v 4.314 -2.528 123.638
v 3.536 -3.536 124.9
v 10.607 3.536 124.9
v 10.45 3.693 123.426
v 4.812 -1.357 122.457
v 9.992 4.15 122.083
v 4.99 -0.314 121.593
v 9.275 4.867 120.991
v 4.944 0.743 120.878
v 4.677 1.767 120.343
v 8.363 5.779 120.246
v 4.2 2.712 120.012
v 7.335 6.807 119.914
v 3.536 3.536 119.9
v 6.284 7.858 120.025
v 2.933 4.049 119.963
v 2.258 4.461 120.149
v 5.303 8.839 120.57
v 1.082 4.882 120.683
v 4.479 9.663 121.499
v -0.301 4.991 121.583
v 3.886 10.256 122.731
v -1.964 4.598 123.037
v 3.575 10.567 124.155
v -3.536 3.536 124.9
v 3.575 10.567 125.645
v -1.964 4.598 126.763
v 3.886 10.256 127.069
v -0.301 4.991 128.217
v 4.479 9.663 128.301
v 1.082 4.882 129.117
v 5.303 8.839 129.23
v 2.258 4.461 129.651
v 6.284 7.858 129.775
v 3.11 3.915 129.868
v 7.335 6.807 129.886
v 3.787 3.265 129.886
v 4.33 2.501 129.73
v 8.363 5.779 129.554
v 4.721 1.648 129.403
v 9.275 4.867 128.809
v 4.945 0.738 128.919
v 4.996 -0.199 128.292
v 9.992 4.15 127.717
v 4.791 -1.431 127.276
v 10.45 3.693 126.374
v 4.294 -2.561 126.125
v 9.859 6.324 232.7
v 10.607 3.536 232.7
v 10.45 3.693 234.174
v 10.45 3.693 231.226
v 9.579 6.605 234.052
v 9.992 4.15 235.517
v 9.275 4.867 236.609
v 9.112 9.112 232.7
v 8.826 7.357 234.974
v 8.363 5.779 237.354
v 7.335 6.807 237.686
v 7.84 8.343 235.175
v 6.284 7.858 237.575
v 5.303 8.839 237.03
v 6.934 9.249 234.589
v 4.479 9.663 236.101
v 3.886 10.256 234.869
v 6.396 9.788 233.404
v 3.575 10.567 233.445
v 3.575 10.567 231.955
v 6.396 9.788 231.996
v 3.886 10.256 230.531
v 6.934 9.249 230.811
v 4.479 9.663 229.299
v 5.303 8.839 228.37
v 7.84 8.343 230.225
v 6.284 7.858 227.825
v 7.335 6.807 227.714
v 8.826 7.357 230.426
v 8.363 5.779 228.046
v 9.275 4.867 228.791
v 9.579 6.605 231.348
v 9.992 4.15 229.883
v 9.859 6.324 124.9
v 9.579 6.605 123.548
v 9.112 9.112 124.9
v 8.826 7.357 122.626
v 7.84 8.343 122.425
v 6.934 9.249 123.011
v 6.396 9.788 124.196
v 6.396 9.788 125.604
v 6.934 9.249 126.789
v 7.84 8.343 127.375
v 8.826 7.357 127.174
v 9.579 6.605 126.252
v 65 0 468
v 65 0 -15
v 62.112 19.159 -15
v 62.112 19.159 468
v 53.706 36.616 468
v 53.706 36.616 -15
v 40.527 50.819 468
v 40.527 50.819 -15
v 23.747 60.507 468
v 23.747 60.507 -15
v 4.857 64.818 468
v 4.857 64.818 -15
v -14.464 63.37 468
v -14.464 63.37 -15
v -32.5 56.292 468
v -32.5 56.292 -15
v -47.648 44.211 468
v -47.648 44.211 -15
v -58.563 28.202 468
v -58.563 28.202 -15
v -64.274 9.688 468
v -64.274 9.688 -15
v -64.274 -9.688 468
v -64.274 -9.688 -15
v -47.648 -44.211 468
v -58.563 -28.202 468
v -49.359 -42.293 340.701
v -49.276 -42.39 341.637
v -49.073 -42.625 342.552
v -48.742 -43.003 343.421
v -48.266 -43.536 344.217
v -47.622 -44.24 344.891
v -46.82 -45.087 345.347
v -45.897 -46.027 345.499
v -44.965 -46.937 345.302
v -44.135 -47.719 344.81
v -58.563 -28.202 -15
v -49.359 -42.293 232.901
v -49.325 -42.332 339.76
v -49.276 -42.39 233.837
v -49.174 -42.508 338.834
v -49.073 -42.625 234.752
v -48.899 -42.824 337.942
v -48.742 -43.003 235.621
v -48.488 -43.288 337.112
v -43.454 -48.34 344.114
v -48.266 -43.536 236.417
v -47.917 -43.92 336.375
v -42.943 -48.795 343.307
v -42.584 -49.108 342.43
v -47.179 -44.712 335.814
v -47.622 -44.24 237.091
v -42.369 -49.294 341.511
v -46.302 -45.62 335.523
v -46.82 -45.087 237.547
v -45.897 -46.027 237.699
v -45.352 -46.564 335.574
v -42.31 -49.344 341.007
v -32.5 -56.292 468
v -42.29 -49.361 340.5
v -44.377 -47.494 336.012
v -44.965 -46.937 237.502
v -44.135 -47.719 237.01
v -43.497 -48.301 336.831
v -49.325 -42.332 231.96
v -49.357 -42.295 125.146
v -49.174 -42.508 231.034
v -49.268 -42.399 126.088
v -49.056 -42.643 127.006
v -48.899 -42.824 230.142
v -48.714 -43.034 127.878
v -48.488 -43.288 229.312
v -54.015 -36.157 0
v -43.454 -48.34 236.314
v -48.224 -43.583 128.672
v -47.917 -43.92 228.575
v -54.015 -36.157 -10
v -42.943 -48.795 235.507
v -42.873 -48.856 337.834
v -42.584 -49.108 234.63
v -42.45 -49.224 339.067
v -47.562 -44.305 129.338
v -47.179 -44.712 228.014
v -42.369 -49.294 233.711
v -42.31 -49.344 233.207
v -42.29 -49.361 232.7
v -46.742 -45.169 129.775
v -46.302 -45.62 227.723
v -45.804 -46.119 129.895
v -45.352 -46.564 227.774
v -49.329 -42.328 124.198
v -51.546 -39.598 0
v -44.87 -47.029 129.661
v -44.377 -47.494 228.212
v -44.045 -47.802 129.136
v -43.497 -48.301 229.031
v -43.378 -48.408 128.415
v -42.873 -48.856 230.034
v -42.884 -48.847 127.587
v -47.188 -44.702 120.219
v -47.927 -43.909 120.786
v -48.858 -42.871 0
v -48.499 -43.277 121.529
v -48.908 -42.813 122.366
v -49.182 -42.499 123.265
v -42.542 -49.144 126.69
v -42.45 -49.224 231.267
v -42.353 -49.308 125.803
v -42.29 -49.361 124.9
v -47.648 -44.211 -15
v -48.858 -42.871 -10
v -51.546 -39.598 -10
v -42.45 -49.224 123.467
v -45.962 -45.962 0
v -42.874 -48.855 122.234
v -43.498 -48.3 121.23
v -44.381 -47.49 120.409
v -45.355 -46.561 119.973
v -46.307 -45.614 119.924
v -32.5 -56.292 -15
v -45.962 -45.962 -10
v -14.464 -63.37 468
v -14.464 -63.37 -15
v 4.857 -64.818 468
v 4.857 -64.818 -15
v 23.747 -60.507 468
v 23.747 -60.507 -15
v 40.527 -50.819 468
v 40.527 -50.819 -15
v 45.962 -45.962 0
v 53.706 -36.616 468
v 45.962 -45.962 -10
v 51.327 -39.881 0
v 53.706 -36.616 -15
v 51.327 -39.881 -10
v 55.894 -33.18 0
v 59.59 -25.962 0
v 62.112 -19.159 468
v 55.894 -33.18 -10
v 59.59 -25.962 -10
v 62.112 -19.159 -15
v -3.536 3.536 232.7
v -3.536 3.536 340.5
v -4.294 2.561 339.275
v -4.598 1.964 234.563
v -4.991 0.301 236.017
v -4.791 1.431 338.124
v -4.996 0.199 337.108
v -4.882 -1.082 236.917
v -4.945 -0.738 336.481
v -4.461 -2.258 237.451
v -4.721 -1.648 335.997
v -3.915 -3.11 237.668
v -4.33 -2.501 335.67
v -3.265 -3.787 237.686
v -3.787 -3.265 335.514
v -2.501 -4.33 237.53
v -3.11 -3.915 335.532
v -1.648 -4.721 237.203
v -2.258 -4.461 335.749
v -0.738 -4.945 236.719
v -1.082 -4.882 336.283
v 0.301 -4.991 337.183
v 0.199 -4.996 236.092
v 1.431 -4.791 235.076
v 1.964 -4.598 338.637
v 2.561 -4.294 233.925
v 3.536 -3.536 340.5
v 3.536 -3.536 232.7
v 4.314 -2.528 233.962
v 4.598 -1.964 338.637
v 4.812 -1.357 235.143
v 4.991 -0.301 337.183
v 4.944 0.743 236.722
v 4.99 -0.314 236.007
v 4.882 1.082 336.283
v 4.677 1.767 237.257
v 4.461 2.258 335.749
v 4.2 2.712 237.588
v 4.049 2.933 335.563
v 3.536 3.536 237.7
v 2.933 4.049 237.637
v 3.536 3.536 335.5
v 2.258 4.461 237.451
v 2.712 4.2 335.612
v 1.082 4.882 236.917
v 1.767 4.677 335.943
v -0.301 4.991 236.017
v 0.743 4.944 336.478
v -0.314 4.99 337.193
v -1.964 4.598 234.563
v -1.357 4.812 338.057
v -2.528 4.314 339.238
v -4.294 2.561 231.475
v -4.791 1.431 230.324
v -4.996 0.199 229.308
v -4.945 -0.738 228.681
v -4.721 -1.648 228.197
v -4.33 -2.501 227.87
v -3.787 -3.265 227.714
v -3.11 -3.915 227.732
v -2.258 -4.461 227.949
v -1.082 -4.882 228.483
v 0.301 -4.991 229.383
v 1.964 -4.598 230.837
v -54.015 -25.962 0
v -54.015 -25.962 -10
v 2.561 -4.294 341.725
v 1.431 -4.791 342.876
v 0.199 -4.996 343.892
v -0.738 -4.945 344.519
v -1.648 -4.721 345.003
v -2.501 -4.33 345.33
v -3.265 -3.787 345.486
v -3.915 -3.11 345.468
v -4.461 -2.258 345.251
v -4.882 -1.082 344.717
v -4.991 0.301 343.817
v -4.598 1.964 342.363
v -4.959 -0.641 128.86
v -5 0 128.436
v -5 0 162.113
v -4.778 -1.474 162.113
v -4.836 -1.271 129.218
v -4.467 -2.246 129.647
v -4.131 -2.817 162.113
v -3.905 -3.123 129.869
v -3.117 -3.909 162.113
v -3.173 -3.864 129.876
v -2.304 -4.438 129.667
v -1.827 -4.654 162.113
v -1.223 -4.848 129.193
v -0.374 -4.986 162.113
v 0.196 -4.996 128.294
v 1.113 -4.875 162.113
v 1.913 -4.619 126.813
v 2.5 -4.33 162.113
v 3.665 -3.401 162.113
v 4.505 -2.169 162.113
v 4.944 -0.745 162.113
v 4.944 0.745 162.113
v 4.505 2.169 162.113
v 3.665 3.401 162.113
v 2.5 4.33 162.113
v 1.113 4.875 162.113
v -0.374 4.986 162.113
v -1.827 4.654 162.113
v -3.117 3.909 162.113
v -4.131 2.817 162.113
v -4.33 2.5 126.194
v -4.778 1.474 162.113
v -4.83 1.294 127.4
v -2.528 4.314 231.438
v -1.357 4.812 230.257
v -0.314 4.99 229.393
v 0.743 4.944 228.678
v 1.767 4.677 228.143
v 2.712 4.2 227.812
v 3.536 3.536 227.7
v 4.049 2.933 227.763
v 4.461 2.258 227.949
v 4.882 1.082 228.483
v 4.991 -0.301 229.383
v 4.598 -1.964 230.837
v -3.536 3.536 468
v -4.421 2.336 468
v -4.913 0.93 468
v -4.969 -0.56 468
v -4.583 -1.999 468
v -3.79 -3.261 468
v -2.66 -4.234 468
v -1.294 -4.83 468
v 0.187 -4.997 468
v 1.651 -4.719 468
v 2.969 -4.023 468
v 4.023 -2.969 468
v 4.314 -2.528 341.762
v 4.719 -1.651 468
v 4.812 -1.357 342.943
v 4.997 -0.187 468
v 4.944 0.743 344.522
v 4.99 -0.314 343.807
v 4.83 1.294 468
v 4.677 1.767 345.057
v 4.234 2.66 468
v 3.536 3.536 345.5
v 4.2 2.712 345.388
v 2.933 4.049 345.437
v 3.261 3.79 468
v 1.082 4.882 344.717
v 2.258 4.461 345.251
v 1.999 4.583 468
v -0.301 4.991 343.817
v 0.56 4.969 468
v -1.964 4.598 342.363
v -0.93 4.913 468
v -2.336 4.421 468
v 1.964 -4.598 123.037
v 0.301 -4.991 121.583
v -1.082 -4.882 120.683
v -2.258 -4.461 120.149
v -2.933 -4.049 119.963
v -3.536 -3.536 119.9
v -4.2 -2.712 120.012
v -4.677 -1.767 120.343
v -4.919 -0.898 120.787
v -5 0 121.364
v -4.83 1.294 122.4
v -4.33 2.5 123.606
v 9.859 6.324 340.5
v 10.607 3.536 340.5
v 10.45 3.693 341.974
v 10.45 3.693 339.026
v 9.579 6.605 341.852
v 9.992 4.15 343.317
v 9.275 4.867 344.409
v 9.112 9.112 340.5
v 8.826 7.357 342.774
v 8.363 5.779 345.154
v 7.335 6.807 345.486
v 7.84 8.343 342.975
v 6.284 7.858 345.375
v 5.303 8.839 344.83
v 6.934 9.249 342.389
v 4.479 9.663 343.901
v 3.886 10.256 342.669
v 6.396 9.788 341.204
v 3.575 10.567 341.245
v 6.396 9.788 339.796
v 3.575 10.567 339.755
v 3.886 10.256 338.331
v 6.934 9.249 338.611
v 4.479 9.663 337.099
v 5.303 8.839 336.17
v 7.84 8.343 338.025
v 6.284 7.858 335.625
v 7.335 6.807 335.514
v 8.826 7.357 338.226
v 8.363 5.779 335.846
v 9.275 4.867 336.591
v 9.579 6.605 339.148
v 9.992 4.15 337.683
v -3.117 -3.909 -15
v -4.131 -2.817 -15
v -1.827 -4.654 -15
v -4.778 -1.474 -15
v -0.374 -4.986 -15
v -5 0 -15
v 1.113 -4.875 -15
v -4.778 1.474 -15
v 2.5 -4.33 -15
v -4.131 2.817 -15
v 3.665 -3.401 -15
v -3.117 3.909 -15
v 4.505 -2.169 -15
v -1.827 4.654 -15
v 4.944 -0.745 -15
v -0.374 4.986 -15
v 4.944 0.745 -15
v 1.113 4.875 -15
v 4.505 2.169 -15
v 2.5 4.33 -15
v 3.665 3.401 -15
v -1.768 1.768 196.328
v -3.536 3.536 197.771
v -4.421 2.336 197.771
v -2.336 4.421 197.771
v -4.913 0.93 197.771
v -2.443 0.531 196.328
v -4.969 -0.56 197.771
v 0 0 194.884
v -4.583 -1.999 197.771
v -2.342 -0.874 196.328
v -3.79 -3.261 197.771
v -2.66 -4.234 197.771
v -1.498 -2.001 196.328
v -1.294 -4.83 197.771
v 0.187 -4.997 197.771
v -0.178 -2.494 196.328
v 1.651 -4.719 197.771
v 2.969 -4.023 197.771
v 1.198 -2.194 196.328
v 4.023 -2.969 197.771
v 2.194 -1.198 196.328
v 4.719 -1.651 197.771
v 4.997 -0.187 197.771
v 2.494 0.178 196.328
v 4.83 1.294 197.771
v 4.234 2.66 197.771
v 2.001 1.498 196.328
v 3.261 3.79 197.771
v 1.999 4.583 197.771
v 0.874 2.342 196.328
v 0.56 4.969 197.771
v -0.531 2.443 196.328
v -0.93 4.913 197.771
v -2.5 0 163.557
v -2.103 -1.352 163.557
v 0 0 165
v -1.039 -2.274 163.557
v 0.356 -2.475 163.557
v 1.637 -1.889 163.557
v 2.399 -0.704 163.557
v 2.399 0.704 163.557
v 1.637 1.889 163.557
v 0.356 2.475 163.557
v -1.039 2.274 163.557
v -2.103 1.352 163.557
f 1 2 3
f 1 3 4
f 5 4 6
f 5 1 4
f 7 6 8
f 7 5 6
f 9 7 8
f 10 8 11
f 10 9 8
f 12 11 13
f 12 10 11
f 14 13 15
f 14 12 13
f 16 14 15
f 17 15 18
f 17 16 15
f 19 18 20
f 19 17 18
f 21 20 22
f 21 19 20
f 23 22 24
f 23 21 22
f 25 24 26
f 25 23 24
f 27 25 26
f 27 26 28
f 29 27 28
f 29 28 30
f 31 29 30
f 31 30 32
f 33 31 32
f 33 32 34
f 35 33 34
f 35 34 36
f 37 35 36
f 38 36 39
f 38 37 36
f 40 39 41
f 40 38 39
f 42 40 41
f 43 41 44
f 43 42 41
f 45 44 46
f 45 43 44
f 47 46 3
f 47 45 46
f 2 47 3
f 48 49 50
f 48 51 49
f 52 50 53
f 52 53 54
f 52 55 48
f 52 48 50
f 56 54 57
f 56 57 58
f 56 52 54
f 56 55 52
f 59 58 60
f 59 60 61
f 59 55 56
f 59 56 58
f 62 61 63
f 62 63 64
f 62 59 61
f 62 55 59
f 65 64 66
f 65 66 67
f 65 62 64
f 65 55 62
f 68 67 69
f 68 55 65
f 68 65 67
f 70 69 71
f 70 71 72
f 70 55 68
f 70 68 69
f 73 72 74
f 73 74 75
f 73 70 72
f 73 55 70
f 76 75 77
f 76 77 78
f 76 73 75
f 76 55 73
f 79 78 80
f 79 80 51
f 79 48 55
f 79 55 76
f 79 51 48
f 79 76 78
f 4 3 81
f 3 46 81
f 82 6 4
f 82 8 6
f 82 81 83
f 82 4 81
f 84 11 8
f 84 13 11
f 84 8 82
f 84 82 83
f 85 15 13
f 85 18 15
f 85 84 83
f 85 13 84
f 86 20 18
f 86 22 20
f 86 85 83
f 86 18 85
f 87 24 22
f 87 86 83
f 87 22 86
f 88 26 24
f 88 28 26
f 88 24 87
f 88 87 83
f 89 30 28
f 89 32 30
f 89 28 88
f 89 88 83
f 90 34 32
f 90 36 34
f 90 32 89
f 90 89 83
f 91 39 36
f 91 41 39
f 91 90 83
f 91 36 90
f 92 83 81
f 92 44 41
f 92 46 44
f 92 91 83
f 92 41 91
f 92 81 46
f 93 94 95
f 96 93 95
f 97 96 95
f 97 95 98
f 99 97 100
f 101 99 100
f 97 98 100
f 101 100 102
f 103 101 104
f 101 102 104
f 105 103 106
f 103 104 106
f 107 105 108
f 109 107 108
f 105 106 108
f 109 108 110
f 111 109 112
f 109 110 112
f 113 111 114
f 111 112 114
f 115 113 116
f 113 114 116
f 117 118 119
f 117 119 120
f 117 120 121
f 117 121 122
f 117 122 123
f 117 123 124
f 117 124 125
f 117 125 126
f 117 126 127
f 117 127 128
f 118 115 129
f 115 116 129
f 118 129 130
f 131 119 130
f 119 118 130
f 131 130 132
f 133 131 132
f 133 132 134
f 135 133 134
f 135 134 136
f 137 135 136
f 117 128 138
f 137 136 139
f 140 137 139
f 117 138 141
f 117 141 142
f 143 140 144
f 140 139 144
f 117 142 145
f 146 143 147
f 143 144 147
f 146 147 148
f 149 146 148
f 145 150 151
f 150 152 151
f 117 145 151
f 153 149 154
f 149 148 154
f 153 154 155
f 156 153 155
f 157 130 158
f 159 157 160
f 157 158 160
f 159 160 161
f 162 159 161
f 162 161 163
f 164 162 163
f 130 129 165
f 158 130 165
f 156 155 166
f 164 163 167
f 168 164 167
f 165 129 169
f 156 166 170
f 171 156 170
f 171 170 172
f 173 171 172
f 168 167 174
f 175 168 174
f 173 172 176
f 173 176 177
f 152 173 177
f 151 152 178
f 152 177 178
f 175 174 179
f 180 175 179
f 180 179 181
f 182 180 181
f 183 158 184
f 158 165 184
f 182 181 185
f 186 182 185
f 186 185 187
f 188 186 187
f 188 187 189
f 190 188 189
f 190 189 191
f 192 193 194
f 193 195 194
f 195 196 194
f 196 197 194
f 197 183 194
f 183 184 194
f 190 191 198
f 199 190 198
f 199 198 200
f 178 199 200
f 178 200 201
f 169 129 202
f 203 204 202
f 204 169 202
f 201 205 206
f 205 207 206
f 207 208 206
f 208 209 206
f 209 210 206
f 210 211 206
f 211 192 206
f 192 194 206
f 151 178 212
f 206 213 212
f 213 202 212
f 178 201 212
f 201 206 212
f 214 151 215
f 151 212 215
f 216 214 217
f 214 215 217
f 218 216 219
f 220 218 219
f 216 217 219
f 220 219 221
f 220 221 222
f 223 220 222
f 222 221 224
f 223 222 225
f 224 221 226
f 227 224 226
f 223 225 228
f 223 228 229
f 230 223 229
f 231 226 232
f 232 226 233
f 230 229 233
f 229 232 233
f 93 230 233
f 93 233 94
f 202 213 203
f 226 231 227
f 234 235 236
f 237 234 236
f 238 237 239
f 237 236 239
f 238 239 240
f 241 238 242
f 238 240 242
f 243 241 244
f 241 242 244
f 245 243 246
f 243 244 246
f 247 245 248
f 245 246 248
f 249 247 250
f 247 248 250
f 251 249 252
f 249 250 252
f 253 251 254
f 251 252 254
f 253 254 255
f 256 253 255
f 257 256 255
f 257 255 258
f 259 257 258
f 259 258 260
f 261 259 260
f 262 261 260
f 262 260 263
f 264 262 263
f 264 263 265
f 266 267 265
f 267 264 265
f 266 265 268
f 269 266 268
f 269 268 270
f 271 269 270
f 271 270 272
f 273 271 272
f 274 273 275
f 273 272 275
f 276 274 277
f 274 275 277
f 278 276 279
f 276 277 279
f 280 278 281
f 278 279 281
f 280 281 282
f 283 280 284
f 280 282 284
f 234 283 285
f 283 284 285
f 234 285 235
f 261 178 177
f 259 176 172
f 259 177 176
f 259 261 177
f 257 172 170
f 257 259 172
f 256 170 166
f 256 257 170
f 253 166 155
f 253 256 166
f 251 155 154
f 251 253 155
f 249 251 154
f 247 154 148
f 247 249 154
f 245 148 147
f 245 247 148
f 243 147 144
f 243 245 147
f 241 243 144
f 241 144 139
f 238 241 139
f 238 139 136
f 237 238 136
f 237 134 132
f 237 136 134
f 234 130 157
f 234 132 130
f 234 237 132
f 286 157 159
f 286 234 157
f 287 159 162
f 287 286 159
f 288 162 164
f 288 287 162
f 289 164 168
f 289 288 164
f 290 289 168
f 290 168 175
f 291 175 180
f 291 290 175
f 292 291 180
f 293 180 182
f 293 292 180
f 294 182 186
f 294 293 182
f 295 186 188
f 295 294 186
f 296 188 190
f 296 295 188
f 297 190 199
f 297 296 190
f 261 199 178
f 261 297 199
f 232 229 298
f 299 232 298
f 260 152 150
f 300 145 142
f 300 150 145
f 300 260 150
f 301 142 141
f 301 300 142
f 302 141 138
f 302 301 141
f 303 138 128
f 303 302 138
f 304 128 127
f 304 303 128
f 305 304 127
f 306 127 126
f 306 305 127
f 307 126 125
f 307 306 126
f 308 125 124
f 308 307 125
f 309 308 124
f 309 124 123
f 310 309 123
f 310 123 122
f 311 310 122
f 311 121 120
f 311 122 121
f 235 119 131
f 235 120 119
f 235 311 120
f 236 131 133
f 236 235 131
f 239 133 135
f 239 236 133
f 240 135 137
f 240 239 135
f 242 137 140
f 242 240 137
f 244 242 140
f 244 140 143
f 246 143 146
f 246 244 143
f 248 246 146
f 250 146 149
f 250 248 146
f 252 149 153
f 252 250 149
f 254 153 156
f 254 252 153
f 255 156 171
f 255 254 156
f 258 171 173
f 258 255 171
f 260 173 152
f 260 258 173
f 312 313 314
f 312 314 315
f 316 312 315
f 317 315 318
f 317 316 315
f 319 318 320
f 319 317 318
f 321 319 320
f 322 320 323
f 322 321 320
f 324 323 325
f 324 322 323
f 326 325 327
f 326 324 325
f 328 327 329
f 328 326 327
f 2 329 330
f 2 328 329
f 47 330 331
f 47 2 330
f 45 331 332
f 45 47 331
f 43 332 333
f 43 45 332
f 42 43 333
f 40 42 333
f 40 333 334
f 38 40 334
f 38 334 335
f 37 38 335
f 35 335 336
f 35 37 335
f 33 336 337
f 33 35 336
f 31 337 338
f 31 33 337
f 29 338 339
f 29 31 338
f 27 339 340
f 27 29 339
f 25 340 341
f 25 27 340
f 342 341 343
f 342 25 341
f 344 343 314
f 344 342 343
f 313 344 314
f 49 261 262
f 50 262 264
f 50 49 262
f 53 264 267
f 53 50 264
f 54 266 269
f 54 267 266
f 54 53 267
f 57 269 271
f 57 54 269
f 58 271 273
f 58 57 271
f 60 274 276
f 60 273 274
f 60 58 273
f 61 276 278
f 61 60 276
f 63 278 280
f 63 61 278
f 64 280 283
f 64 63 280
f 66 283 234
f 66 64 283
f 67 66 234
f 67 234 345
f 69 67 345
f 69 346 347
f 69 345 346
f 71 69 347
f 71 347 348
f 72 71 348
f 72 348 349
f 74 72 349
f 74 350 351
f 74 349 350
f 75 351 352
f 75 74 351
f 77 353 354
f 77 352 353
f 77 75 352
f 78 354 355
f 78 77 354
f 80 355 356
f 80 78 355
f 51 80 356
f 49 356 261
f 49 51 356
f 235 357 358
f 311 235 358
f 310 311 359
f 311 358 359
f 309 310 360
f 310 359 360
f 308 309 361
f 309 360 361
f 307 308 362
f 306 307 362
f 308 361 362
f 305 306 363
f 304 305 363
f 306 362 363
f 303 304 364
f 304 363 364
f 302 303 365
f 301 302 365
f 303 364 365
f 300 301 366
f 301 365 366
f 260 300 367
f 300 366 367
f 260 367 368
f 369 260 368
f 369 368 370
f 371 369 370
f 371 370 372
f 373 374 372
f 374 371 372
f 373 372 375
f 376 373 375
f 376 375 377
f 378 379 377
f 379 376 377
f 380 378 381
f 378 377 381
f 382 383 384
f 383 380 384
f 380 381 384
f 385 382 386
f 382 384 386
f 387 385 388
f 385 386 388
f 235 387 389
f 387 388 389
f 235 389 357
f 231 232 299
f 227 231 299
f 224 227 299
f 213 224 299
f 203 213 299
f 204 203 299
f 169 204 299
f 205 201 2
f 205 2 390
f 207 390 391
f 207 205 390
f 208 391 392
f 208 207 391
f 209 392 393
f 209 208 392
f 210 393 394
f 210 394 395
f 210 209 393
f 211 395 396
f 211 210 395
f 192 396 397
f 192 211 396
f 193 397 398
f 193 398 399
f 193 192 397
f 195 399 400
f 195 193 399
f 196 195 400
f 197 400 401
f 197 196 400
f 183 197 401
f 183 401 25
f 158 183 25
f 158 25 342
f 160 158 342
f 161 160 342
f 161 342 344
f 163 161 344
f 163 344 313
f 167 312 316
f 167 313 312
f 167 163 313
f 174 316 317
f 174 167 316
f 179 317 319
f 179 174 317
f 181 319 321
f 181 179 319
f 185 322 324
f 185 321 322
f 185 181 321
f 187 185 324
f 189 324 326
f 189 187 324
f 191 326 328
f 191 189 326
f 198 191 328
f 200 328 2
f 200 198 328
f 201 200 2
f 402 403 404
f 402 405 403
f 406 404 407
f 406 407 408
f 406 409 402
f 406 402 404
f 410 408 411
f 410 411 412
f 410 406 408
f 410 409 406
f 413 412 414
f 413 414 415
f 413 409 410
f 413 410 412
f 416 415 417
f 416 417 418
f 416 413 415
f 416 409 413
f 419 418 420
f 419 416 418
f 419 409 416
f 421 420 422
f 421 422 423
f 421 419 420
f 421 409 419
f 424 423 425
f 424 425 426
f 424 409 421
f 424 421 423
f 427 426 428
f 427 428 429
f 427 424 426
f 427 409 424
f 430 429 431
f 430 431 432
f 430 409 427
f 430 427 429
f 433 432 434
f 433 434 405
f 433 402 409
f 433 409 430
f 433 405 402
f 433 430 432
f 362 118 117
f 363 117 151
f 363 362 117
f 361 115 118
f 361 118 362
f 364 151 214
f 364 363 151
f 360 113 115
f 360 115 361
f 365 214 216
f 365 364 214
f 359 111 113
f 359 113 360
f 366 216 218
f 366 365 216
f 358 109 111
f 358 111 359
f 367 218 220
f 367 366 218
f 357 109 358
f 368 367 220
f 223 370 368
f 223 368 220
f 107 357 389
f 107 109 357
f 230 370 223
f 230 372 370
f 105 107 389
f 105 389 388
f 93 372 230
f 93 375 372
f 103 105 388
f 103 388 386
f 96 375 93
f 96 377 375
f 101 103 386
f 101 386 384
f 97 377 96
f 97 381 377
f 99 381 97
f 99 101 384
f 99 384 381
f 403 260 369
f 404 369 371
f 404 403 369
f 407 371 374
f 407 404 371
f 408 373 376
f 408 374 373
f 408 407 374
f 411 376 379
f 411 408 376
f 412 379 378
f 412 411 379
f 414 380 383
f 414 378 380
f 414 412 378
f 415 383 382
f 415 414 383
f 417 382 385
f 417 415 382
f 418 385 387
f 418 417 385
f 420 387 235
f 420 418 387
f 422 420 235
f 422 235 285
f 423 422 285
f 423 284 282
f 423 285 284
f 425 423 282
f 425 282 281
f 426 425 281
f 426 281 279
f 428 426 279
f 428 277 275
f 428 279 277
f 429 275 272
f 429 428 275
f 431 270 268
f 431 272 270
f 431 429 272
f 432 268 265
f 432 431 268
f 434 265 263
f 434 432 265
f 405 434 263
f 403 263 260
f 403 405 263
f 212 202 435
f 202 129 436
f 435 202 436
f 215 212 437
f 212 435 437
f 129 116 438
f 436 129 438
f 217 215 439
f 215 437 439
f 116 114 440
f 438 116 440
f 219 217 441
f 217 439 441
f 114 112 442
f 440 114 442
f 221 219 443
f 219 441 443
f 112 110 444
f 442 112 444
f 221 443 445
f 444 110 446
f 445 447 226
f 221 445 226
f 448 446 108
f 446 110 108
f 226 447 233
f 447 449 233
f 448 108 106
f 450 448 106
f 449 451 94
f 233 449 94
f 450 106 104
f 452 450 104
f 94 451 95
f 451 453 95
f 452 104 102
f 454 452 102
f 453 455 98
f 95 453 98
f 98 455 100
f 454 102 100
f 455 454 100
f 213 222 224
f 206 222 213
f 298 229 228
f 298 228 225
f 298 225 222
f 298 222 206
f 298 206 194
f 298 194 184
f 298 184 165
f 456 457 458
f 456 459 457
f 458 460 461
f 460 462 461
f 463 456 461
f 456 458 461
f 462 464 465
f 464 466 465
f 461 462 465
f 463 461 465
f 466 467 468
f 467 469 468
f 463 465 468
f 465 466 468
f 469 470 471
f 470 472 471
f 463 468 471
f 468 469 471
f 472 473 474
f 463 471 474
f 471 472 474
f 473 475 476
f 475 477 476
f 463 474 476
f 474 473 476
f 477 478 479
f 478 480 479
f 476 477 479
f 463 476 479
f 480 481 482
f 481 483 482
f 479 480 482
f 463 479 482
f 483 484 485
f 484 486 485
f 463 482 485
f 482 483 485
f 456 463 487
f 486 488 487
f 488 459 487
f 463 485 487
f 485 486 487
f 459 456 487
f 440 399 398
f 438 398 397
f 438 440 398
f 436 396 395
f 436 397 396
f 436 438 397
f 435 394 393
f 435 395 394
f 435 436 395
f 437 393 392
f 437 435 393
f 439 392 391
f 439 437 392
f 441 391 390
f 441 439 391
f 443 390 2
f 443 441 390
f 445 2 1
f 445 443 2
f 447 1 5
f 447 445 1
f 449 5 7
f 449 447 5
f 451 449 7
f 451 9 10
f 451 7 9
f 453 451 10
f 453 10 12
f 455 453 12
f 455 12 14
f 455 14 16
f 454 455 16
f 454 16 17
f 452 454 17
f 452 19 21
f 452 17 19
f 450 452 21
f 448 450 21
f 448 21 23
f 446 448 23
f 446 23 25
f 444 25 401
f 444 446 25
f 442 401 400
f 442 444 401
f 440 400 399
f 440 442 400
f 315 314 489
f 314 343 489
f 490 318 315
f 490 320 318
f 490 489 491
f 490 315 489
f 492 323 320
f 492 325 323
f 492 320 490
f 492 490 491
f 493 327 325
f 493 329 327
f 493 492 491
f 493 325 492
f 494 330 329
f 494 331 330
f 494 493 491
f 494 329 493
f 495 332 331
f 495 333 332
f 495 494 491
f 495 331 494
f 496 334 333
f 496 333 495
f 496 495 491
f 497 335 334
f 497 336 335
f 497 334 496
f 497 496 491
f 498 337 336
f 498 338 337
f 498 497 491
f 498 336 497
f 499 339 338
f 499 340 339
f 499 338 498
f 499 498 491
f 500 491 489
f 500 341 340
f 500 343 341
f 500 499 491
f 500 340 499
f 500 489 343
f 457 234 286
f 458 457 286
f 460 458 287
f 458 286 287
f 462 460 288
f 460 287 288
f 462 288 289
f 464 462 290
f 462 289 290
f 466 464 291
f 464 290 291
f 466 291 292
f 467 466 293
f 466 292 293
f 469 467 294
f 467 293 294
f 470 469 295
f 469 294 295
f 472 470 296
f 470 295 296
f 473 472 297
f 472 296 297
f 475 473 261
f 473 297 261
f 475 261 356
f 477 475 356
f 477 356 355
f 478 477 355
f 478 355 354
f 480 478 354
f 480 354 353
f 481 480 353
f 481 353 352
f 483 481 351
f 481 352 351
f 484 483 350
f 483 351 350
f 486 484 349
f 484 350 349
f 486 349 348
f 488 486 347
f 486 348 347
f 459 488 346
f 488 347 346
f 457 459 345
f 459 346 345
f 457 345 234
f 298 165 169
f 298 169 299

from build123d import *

# Parameters (mm, degrees)
EXTRUDEASSE_DEPTH      = 468
EXTRUDEASSE_DEPTH_BACK = 15
SKETCH1_R              = 65
SKETCH6_W              = 125.765742684
SKETCH6_H              = 20
CUT_EXTRUDE1_DEPTH     = 10


with BuildPart() as part:
    # Sketch1 → ExtrudeAsse (new, two sides: drawn at the far end of the back side and taken through both)
    with BuildSketch(Plane.XY.offset(-EXTRUDEASSE_DEPTH_BACK)):
        Circle(SKETCH1_R)
    extrude(amount=EXTRUDEASSE_DEPTH + EXTRUDEASSE_DEPTH_BACK)

    # Sketch3 → Cut-Revolve1 (revolve, cut)
    with BuildSketch(Plane(origin=(0, 0, 0), x_dir=(0, 0, -1), z_dir=(0.7071067811865414, -0.7071067811865537, 0)), mode=Mode.PRIVATE) as cut_revolve1_sk:
        Polygon((-227.7, -65), (-227.7, 10), (-232.7, 12.886751346), (-232.7, 0), (-232.7, -65), align=None)
    revolve(cut_revolve1_sk.sketch.rotate(Axis((0, 0, 232.7), (-0.7071067811865537, -0.7071067811865414, 0)), 90), axis=Axis((0, 0, 232.7), (-0.7071067811865537, -0.7071067811865414, 0)), mode=Mode.SUBTRACT)

    # Sketch3<3> → Cut-Revolve2 (revolve, cut)
    with BuildSketch(Plane(origin=(0, 0, 0), x_dir=(0, 0, -1), z_dir=(0.7071067811865414, -0.7071067811865537, 0)), mode=Mode.PRIVATE) as cut_revolve2_sk:
        Polygon((-340.5, 10), (-340.5, -65), (-335.5, -65), (-335.5, 10), (-340.5, 12.886751346), align=None)
    revolve(cut_revolve2_sk.sketch.rotate(Axis((7.071067812, 7.071067812, 340.5), (-0.7071067811865537, -0.7071067811865415, 0)), 90), axis=Axis((7.071067812, 7.071067812, 340.5), (-0.7071067811865537, -0.7071067811865415, 0)), mode=Mode.SUBTRACT)

    # Sketch4 → Cut-Revolve5 (revolve, cut)
    with BuildSketch(Plane(origin=(0, 0, 0), x_dir=(0, 0, -1), z_dir=(1, 0, 0)), mode=Mode.PRIVATE) as cut_revolve5_sk:
        Polygon((-468, 0), (-197.77110668, 0), (-194.884355334, 0), (-197.77110668, -5), (-468, -5), align=None)
    revolve(cut_revolve5_sk.sketch.rotate(Axis((0, 0, 0), (0, 0, 1)), 225), axis=Axis((0, 0, 0), (0, 0, 1)), mode=Mode.SUBTRACT)

    # Sketch5 → Cut-Revolve6 (revolve, cut)
    with BuildSketch(Plane(origin=(0, 0, 0), x_dir=(0, 0, -1), z_dir=(1, 0, 0)), mode=Mode.PRIVATE) as cut_revolve6_sk:
        Polygon((15, -5), (15, 0), (-162.113248654, 0), (-165, 0), (-162.113248654, -5), align=None)
    revolve(cut_revolve6_sk.sketch.rotate(Axis((0, 0, 0), (0, 0, 1)), 270), axis=Axis((0, 0, 0), (0, 0, 1)), mode=Mode.SUBTRACT)

    # Sketch3<5> → Cut-Revolve7 (revolve, cut)
    with BuildSketch(Plane(origin=(0, 0, 0), x_dir=(0, 0, -1), z_dir=(0.7071067811865414, -0.7071067811865537, 0)), mode=Mode.PRIVATE) as cut_revolve7_sk:
        Polygon((-124.9, 10), (-124.9, 12.886751346), (-119.9, 10), (-119.9, -65), (-124.9, -65), align=None)
    revolve(cut_revolve7_sk.sketch.rotate(Axis((-45.961940777, -45.961940777, 124.9), (0.7071067811865537, 0.7071067811865415, 0)), 270), axis=Axis((-45.961940777, -45.961940777, 124.9), (0.7071067811865537, 0.7071067811865415, 0)), mode=Mode.SUBTRACT)

    # Sketch6 → Cut-Extrude1 (cut)
    with BuildSketch(Plane(origin=(0, 0, 0), x_dir=(-1, 0, 0), z_dir=(0, 0, -1))):
        with Locations((-8.867505506, -35.961940777)):
            Rectangle(SKETCH6_W, SKETCH6_H)
    extrude(amount=CUT_EXTRUDE1_DEPTH, mode=Mode.SUBTRACT)


solid = part.part
